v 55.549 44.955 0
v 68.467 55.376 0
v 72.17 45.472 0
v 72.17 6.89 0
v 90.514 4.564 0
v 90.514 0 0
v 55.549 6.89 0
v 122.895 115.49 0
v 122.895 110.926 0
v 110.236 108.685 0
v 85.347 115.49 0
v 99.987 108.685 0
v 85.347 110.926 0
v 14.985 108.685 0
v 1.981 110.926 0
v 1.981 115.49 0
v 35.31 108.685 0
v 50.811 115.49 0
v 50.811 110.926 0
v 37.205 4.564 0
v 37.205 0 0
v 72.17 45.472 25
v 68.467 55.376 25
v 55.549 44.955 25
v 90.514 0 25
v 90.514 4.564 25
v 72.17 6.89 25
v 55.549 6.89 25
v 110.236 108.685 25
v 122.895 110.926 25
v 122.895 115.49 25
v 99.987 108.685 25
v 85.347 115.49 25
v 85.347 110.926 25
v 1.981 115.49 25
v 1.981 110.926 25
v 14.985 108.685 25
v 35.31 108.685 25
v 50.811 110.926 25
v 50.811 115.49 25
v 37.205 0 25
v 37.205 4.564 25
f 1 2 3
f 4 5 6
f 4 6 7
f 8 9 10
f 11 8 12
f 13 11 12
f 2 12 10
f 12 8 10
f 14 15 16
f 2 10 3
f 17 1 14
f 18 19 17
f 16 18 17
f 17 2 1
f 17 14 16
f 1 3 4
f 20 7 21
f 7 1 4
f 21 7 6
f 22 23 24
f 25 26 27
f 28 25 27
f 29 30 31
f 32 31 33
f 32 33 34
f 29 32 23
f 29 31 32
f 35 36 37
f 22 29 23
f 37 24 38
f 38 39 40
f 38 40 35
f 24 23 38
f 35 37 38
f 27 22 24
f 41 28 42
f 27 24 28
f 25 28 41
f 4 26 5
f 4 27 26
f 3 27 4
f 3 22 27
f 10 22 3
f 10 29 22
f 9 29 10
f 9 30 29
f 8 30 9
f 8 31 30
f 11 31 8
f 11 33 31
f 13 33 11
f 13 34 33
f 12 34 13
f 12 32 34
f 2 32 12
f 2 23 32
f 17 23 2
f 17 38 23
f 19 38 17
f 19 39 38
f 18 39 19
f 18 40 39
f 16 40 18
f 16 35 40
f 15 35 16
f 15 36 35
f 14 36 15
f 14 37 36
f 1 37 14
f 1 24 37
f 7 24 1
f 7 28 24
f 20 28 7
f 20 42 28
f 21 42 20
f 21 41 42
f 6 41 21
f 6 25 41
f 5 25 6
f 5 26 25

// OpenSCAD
block_xy_size=127;
block_z=25;

linear_extrude(height = block_z)
text("Y", font = "Times New Roman", size=block_xy_size);
